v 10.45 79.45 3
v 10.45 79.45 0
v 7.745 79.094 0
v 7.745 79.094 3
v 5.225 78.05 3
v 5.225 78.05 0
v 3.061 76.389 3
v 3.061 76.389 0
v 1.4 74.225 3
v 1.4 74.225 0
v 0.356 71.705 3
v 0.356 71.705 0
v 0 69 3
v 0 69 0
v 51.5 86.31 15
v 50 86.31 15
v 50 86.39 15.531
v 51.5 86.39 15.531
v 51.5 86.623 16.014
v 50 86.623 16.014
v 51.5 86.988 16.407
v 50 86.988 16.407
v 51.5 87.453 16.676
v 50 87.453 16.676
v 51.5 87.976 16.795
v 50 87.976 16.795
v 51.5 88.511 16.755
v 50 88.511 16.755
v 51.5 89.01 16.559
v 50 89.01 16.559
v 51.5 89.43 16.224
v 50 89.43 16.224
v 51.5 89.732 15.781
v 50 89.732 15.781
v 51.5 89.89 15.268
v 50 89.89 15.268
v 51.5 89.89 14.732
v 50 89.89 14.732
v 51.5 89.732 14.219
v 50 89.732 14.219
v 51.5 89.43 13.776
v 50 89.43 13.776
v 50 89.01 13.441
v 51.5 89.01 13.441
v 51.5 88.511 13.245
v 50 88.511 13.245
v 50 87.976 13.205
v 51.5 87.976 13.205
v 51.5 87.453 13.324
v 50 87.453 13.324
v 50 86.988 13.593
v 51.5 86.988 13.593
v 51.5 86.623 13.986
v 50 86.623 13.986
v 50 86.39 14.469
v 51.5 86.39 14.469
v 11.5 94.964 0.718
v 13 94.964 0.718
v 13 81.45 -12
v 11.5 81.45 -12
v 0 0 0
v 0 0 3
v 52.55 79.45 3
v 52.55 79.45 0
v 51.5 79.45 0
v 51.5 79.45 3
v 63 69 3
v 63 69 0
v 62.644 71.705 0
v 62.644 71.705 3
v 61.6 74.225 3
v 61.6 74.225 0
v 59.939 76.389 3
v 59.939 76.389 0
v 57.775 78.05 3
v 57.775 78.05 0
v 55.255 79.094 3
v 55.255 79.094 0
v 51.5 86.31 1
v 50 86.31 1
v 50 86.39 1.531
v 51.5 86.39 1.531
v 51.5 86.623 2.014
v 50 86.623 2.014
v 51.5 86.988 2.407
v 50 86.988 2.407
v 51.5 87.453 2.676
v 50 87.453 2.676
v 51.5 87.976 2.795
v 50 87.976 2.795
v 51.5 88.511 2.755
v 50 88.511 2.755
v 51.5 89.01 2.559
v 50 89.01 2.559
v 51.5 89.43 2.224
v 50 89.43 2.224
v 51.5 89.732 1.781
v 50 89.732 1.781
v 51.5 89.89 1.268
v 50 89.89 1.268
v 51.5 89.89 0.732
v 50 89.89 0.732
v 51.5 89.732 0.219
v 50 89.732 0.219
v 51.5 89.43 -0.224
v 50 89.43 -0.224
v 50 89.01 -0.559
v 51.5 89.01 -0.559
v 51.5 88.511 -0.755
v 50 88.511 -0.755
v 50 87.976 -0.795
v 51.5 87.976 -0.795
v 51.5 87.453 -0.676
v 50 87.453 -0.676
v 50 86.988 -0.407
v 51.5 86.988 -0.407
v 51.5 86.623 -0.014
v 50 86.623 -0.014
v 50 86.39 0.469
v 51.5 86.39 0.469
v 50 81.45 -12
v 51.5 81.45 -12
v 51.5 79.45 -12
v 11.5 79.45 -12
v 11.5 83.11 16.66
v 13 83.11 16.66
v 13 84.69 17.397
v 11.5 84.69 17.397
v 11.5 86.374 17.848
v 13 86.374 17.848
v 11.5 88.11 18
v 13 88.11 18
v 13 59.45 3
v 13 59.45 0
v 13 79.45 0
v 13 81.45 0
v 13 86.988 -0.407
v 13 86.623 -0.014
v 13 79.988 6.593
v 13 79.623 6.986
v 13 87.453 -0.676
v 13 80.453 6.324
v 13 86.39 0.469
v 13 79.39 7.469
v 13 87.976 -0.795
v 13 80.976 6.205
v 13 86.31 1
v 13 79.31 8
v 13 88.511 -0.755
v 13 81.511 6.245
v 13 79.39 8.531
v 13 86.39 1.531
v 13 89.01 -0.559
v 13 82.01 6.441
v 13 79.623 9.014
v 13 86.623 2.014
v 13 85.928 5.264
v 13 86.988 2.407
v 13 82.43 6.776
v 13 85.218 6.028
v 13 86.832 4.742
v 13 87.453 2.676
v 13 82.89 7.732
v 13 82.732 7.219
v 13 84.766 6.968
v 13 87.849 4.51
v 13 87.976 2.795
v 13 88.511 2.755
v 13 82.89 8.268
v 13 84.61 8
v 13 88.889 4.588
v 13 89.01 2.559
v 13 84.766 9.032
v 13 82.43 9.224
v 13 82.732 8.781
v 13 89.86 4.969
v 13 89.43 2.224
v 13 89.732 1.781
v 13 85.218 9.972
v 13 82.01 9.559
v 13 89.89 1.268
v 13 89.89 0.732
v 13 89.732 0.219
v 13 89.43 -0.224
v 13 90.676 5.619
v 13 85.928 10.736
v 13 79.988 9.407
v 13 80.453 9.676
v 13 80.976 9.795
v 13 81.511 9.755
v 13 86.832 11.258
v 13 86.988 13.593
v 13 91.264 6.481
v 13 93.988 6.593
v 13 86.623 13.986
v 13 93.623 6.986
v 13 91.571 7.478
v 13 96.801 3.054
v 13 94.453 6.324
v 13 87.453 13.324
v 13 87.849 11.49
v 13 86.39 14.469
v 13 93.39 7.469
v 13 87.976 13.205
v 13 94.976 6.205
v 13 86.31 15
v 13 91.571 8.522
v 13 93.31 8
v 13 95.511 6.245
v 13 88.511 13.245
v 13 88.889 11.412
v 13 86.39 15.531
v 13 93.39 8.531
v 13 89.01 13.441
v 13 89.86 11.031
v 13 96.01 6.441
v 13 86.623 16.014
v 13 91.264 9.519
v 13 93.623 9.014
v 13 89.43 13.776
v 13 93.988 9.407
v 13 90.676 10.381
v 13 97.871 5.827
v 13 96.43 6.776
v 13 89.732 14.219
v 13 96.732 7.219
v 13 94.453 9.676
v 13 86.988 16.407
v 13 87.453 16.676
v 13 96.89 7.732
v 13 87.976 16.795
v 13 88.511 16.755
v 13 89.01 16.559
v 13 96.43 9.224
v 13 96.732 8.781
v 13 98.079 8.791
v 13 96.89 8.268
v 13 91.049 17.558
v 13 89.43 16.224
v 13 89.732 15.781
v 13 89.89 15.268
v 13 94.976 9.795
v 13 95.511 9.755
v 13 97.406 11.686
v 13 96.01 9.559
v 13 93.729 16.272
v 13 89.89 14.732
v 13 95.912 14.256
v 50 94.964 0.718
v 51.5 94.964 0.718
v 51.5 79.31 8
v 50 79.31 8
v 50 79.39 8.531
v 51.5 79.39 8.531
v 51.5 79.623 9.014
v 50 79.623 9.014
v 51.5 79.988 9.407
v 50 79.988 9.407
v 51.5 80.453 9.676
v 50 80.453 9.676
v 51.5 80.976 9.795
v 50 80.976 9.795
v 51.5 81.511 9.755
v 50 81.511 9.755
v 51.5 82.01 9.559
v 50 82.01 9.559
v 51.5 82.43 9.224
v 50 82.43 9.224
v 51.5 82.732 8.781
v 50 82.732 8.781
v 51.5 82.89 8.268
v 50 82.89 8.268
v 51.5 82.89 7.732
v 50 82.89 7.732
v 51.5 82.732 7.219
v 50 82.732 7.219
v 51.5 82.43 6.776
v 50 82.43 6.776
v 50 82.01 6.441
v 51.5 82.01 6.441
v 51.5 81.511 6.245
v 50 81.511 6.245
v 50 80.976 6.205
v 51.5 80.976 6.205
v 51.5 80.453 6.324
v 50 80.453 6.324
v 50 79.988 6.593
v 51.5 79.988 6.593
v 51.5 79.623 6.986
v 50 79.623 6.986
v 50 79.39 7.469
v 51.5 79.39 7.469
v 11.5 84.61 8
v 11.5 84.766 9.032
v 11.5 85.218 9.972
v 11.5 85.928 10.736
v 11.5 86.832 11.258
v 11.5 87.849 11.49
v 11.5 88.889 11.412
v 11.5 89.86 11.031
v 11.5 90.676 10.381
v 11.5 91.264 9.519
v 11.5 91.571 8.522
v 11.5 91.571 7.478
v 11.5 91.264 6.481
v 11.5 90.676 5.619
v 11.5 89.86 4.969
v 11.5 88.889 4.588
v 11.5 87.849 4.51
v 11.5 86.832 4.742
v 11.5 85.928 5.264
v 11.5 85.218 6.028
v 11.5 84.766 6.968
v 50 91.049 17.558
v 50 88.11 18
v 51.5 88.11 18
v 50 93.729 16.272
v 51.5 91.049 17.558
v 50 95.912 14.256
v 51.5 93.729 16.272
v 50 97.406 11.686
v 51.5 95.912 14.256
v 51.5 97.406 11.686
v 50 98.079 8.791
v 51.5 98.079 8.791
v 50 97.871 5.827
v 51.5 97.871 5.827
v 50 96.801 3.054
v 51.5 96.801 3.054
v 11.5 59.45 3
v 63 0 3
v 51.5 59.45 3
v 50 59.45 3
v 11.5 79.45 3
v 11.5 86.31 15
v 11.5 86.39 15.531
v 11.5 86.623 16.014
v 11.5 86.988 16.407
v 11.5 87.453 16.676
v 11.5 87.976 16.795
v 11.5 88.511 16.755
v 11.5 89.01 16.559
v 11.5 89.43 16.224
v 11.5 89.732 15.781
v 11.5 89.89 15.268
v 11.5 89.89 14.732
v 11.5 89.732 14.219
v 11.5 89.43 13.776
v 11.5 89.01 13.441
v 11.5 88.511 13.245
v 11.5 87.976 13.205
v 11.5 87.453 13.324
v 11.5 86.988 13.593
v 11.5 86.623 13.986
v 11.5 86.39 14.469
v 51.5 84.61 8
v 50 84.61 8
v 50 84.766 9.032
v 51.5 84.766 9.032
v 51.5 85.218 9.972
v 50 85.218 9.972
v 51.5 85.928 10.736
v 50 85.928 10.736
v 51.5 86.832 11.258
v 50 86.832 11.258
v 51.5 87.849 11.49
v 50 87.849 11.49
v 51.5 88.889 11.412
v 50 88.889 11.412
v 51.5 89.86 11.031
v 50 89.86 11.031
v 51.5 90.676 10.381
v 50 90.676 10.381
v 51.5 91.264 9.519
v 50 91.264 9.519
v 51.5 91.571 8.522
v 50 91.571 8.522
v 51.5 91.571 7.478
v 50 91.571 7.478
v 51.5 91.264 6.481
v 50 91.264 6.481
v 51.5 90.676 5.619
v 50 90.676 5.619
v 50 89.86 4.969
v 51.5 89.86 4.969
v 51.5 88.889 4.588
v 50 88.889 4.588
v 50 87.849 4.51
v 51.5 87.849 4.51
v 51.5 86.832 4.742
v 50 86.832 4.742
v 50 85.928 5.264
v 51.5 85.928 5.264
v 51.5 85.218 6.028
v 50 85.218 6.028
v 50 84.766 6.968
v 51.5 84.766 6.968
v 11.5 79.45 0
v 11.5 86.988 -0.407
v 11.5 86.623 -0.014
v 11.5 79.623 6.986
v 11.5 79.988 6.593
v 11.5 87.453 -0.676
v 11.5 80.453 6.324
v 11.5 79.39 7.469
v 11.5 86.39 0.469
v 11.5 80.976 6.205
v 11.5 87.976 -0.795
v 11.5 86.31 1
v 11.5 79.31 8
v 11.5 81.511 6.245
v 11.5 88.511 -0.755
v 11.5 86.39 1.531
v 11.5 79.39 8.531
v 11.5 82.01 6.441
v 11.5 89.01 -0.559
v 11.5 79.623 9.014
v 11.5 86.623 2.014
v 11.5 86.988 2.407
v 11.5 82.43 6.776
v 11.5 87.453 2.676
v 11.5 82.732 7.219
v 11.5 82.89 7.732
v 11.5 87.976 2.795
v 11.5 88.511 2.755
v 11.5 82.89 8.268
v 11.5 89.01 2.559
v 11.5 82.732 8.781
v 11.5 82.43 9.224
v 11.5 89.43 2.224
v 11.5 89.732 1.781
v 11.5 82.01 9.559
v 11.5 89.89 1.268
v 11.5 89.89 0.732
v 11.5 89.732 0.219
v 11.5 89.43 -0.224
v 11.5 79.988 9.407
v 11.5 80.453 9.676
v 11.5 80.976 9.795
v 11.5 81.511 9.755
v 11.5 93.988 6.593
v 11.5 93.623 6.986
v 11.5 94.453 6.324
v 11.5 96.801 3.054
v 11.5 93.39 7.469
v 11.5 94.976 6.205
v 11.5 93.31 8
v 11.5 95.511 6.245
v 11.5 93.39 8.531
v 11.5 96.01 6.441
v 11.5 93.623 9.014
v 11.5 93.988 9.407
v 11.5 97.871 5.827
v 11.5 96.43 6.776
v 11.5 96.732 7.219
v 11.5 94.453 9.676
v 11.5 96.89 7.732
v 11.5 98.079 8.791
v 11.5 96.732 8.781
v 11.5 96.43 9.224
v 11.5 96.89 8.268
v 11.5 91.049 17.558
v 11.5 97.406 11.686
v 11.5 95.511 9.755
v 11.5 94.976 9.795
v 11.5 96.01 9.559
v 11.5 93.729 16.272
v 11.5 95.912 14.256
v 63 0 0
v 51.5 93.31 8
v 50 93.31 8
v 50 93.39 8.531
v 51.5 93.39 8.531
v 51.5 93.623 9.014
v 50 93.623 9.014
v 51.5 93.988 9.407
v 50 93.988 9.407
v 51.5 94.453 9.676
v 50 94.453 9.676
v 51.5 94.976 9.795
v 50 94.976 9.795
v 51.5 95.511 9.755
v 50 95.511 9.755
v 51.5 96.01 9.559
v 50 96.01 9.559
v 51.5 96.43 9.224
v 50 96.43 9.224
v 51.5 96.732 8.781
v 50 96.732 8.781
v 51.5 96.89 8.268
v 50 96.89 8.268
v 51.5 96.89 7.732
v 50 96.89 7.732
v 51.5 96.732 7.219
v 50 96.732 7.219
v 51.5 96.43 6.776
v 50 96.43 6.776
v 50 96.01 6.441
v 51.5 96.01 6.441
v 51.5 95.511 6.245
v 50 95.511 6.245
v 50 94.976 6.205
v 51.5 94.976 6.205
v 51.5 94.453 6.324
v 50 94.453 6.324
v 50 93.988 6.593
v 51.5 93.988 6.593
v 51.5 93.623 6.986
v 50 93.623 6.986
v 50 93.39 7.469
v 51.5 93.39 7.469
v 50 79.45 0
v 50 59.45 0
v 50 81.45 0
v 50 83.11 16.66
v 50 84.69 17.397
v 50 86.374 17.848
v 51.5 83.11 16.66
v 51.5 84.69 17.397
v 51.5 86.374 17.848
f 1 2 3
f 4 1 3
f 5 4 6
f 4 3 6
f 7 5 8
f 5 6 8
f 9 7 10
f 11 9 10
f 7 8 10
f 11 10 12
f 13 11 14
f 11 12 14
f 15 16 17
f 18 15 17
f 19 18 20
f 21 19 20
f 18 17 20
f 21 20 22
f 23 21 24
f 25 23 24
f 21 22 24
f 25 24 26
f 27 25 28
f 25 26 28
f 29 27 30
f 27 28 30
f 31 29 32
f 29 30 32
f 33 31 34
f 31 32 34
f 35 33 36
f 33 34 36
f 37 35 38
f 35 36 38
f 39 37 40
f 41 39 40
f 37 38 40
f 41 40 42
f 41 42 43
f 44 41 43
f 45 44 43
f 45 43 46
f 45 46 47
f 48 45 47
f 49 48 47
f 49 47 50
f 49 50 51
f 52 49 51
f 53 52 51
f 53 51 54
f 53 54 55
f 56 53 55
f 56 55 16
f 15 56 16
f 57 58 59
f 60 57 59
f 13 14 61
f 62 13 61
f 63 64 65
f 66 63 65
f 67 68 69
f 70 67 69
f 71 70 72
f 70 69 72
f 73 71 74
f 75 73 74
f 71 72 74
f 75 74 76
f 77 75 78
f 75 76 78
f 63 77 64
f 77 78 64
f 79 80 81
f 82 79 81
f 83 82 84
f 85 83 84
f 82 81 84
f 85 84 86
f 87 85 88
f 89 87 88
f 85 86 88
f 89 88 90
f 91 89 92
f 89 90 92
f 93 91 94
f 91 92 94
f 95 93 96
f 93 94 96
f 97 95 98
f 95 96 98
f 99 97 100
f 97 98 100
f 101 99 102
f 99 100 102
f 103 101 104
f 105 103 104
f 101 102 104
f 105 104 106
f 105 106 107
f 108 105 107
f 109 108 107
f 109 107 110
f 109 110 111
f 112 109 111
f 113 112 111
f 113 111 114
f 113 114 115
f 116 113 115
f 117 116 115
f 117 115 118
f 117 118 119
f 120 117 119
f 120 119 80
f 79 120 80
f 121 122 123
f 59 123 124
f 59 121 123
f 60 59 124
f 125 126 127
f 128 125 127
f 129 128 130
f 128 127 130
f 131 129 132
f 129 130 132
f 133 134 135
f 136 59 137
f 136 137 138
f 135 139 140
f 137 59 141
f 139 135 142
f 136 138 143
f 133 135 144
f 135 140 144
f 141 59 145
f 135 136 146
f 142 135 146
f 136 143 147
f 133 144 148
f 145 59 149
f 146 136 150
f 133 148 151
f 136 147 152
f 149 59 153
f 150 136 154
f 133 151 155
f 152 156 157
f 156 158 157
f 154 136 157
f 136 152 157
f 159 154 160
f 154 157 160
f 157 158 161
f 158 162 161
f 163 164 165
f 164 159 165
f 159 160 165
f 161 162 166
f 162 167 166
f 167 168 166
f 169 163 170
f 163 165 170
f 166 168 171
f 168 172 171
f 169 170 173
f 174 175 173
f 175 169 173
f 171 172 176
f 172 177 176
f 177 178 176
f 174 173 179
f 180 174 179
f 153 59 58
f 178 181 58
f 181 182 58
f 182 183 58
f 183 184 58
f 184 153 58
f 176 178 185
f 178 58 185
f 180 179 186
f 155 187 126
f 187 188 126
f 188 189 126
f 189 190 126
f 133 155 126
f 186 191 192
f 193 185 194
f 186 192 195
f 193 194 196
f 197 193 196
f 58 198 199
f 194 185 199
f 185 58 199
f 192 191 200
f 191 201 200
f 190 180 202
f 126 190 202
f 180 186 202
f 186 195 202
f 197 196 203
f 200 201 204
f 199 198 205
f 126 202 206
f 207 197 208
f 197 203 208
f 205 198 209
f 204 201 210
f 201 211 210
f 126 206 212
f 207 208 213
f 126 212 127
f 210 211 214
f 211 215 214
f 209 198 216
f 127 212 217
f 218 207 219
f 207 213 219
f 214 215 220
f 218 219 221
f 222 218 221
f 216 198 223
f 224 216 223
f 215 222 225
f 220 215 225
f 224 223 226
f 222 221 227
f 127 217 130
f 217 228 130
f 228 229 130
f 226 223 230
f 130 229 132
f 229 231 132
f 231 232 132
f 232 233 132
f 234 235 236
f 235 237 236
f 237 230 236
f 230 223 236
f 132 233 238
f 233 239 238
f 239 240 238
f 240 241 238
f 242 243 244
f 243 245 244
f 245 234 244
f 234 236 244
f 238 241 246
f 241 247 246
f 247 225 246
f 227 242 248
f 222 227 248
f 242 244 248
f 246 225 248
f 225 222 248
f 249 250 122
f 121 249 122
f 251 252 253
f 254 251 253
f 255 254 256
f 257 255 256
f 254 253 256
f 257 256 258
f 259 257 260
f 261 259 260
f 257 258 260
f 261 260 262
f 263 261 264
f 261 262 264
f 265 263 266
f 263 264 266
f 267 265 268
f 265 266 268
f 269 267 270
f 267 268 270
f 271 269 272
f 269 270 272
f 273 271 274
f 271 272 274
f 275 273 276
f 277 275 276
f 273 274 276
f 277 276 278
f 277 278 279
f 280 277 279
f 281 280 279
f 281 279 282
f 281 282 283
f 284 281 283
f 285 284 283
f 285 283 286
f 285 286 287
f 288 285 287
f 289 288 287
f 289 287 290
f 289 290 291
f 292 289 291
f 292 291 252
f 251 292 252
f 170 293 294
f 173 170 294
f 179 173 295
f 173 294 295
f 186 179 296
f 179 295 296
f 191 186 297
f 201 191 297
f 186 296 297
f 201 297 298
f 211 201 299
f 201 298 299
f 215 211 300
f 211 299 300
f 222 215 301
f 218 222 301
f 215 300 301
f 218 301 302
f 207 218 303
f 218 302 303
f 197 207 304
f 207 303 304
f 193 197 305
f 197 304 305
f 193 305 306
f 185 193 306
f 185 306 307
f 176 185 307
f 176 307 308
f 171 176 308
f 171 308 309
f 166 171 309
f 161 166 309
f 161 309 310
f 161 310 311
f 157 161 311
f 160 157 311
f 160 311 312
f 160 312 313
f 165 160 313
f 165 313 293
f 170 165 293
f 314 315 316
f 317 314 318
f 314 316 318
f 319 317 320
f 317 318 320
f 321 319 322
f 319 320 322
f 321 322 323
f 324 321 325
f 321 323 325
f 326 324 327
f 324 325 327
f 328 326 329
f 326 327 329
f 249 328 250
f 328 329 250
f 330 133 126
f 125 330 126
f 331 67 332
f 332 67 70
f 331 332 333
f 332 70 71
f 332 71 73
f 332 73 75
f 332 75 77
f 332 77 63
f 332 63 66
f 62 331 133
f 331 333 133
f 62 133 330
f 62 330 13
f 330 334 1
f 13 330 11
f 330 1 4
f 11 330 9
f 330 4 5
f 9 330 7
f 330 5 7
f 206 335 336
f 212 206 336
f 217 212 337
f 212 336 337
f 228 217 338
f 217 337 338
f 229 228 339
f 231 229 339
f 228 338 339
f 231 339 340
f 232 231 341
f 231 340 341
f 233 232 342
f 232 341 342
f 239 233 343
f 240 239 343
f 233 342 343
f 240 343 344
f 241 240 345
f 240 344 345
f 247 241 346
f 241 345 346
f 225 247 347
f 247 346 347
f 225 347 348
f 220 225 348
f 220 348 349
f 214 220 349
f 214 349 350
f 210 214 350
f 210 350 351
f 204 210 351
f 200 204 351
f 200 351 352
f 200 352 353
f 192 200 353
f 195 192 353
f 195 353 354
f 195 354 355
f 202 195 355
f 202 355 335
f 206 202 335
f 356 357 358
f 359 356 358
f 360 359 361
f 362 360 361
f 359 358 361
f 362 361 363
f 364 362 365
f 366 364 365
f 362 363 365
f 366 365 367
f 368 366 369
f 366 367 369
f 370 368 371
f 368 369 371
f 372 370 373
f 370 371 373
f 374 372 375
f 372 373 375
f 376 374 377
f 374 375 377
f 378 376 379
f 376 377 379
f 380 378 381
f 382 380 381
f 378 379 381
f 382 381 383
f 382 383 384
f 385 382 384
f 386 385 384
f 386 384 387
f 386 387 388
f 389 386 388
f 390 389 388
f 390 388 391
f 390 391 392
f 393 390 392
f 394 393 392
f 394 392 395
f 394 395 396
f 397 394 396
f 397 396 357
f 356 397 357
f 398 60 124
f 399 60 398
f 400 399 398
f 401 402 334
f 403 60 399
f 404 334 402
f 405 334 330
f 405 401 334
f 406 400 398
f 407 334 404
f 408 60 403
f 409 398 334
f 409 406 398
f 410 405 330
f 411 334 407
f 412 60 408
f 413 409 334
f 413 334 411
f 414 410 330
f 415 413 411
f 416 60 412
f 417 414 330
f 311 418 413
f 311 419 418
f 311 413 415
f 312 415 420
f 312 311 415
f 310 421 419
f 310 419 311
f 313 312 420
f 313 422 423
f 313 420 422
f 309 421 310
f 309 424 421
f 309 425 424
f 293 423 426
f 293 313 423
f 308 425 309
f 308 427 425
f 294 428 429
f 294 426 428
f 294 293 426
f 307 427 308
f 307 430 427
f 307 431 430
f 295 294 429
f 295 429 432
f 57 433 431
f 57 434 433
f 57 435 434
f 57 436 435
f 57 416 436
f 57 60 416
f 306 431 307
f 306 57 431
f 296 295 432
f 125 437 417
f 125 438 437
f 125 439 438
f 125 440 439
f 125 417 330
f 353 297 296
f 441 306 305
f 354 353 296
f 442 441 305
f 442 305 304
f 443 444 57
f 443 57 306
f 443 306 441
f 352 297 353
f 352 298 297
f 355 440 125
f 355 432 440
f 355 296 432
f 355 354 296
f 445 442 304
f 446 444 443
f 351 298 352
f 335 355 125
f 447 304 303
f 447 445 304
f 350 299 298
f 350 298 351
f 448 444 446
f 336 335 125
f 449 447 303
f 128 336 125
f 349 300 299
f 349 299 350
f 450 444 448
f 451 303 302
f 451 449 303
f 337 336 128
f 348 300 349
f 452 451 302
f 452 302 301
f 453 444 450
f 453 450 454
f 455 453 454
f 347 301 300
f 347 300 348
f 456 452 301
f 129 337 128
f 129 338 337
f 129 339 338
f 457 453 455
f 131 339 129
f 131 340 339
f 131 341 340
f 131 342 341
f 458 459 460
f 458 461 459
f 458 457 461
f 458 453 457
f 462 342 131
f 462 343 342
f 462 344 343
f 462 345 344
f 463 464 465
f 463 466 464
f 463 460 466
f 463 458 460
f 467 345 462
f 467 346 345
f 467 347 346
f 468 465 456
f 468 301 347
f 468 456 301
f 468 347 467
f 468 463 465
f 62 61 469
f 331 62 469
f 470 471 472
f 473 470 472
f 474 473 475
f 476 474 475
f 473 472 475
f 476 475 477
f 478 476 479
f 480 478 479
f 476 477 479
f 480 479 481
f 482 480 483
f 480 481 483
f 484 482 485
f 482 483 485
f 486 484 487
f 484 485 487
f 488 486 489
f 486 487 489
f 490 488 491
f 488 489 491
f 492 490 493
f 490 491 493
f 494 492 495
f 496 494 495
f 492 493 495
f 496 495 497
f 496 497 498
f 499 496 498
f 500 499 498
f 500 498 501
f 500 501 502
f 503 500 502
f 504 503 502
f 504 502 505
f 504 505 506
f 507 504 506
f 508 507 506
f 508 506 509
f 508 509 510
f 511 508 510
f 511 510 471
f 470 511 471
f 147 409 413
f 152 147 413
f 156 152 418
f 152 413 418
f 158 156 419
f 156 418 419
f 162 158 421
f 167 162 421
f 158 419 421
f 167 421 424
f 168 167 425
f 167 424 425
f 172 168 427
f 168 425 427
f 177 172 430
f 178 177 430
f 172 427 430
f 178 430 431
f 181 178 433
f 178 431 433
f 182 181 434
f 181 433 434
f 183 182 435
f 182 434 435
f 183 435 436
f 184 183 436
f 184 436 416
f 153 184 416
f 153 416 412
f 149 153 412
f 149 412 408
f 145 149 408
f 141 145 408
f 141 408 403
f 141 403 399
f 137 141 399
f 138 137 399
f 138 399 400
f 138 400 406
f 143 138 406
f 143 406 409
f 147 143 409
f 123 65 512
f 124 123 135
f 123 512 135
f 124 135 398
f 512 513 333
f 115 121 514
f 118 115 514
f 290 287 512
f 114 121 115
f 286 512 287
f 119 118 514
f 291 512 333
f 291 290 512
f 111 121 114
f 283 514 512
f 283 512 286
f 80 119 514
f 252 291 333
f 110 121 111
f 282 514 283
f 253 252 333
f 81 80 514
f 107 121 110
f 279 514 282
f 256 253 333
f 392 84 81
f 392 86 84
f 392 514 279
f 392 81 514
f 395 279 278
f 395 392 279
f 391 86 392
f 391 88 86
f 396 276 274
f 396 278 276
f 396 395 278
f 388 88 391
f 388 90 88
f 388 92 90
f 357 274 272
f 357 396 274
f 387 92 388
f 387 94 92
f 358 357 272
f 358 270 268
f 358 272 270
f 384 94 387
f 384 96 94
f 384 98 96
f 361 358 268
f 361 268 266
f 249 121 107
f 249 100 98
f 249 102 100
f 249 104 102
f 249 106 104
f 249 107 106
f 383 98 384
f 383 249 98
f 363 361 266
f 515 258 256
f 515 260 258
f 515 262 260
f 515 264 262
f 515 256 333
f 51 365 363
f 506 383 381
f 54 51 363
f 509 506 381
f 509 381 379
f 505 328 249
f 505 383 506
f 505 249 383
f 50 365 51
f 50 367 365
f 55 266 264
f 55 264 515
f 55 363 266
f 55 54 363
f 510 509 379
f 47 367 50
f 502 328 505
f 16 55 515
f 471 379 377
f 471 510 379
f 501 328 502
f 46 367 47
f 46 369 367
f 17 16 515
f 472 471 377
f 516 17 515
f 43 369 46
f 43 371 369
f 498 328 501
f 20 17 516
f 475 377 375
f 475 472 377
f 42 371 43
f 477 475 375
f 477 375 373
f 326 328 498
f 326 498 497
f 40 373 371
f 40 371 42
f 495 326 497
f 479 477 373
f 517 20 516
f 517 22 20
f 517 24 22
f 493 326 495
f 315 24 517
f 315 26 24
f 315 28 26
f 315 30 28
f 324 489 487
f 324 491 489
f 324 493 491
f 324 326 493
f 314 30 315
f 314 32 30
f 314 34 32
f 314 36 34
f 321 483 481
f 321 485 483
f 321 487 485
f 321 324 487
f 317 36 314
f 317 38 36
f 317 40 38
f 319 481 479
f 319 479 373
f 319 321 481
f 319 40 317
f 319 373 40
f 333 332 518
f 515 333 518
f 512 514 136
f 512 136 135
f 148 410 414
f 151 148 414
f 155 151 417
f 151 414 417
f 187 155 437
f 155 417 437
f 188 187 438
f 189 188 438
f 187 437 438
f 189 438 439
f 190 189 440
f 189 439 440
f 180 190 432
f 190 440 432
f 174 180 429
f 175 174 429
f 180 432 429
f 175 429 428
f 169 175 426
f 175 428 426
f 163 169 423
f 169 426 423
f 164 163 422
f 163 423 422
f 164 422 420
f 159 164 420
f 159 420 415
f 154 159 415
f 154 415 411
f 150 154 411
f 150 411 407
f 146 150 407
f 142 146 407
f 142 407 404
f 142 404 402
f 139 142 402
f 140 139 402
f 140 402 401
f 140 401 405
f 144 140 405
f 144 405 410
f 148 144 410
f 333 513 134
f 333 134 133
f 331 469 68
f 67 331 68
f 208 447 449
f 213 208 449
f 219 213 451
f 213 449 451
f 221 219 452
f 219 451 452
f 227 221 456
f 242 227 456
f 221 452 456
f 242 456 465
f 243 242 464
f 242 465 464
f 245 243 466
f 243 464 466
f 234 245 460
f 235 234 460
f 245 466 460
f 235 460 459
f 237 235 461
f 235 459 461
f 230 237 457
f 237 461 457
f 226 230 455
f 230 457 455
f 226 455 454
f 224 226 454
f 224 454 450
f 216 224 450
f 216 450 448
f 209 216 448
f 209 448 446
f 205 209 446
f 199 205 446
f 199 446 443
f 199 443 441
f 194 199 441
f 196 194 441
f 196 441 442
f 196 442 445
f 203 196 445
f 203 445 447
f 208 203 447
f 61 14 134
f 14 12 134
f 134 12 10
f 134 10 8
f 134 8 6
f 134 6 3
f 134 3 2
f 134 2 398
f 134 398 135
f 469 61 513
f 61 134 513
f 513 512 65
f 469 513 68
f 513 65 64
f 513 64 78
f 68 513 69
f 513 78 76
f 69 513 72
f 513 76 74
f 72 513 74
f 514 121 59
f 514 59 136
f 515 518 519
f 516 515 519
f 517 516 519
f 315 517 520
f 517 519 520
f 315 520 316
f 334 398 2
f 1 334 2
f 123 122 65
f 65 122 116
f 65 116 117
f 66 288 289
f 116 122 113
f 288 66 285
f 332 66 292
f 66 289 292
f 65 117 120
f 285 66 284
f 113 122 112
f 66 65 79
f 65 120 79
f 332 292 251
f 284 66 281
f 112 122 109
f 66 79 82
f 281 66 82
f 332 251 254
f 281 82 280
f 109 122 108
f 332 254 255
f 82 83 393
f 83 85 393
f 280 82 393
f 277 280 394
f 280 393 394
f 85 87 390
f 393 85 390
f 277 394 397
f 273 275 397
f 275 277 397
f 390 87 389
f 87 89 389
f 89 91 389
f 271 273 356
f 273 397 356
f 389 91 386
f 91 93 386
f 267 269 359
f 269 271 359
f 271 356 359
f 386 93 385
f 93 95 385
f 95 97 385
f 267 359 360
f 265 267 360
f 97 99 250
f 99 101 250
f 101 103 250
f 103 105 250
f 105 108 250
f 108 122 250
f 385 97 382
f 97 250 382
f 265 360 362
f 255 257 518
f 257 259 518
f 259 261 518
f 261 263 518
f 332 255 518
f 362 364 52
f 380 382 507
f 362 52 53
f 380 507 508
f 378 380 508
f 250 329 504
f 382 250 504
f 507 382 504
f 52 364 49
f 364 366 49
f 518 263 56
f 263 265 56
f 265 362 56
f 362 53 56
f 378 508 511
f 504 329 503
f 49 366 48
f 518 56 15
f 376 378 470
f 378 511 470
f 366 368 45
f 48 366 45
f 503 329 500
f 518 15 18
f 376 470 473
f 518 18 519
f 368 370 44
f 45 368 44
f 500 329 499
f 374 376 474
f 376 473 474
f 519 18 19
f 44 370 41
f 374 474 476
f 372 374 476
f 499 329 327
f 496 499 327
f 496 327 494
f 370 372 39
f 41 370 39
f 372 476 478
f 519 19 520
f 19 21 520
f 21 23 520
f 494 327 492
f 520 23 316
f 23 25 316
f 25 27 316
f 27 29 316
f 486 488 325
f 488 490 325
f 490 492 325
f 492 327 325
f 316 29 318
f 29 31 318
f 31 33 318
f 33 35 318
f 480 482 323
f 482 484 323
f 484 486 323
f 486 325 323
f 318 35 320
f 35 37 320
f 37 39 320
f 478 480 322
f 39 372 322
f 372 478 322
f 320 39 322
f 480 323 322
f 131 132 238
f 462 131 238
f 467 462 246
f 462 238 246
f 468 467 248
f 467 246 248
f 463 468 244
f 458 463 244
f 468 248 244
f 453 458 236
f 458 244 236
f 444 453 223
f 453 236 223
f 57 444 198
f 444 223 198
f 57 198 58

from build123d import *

# Parameters (mm, degrees)
EXTRUDE_1_DEPTH          = 3
SKETCH_13_W              = 40
SKETCH_13_H              = 2
EXTRUDE_3_DEPTH          = 15
EXTRUDE_4_DEPTH          = 20
EXTRUDE_4_DEPTH_BACK     = 20
CUT_EXTRUDE_6_DEPTH      = 18.5
CUT_EXTRUDE_6_DEPTH_BACK = 18.5
CUT_EXTRUDE_7_REACH      = 114.258
SKETCH_16_R              = 1.8
SKETCH_16_R_2            = 3.5


with BuildPart() as part:
    # 草图2 → 凸台-拉伸1 (new body)
    with BuildSketch(Plane.XY):
        with BuildLine():
            Line((0, 0), (63, 0))
            Line((63, 0), (63, 69))
            ThreePointArc((63, 69), (59.939265863, 76.389265863), (52.55, 79.45))
            Line((52.55, 79.45), (10.45, 79.45))
            ThreePointArc((10.45, 79.45), (3.060734137, 76.389265863), (0, 69))
            Line((0, 69), (0, 0))
        make_face()
    extrude(amount=EXTRUDE_1_DEPTH)

    # 草图13 → 凸台-拉伸3 (add)
    with BuildSketch(Plane(origin=(0, 0, 3), x_dir=(-1, 0, 0), z_dir=(0, 0, -1))):
        with Locations((-31.5, 80.45)):
            Rectangle(SKETCH_13_W, SKETCH_13_H)
    extrude(amount=EXTRUDE_3_DEPTH)

    # 草图14 → 凸台-拉伸4 (add, two sides: drawn at the far end of the back side and taken through both)
    with BuildSketch(Plane.ZY.offset(-31.5).offset(-EXTRUDE_4_DEPTH_BACK)):
        with BuildLine():
            ThreePointArc((3, 79.45), (10.588190451, 78.450995775), (16.660254038, 83.110254038))
            ThreePointArc((16.660254038, 83.110254038), (17.659258263, 85.522063587), (18, 88.110254038))
            ThreePointArc((18, 88.110254038), (11.686285655, 97.406021788), (0.717740386, 94.9636251))
            ThreePointArc((0.717740386, 94.9636251), (-1.999142036, 88.241244641), (0.540709407, 81.45))
            Line((0.540709407, 81.45), (3, 81.45))
            Line((3, 81.45), (3, 79.45))
        make_face()
        with BuildLine():
            ThreePointArc((0.540709407, 81.45), (1.690603791, 80.351934666), (3, 79.45))
            Line((3, 79.45), (3, 81.45))
            Line((3, 81.45), (0.540709407, 81.45))
        make_face()
        with BuildLine():
            ThreePointArc((0.540709407, 81.45), (-1.999142036, 88.241244641), (0.717740386, 94.9636251))
            Line((0.717740386, 94.9636251), (-12, 81.45))
            Line((-12, 81.45), (0.540709407, 81.45))
        make_face()
        with BuildLine():
            Line((3, 59.45), (16.660254038, 83.110254038))
            ThreePointArc((16.660254038, 83.110254038), (10.588190451, 78.450995775), (3, 79.45))
            Line((3, 79.45), (3, 59.45))
        make_face()
    extrude(amount=EXTRUDE_4_DEPTH + EXTRUDE_4_DEPTH_BACK)

    # 草图15 → 切除-拉伸6 (cut, two sides: drawn at the far end of the back side and taken through both)
    with BuildSketch(Plane.ZY.offset(-31.5).offset(-CUT_EXTRUDE_6_DEPTH_BACK)):
        with BuildLine():
            Line((0, 59.45), (3, 59.45))
            Line((3, 59.45), (16.660254038, 83.110254038))
            ThreePointArc((16.660254038, 83.110254038), (13.96660025, 96.13519525), (0.717740386, 94.9636251))
            Line((0.717740386, 94.9636251), (-12, 81.45))
            Line((-12, 81.45), (0, 81.45))
            Line((0, 81.45), (0, 59.45))
        make_face()
    extrude(amount=CUT_EXTRUDE_6_DEPTH + CUT_EXTRUDE_6_DEPTH_BACK, mode=Mode.SUBTRACT)

    # 切除-拉伸7: up to this face of the body (flat: up to its plane)
    cut_extrude_7_end = Plane(part.part.faces().sort_by_distance((51.5, 84.002247989, 5.535309017))[0])
    # 草图16 → 切除-拉伸7 (cut, up to the picked face)
    with BuildSketch(Plane.ZY.offset(-11.5), mode=Mode.PRIVATE) as cut_extrude_7_sk1:
        with Locations(Location((8, 95.110254038, 0), (0, 0, 270))):
            Circle(SKETCH_16_R)
    cut_extrude_7_tool1 = split(extrude(cut_extrude_7_sk1.sketch, amount=-CUT_EXTRUDE_7_REACH, mode=Mode.PRIVATE), bisect_by=cut_extrude_7_end, keep=Keep.BOTH, mode=Mode.PRIVATE)
    # 草图16 → 切除-拉伸7 (cut, up to the picked face)
    with BuildSketch(Plane.ZY.offset(-11.5), mode=Mode.PRIVATE) as cut_extrude_7_sk2:
        with Locations(Location((15, 88.110254038, 0), (0, 0, 270))):
            Circle(SKETCH_16_R)
    cut_extrude_7_tool2 = split(extrude(cut_extrude_7_sk2.sketch, amount=-CUT_EXTRUDE_7_REACH, mode=Mode.PRIVATE), bisect_by=cut_extrude_7_end, keep=Keep.BOTH, mode=Mode.PRIVATE)
    # 草图16 → 切除-拉伸7 (cut, up to the picked face)
    with BuildSketch(Plane.ZY.offset(-11.5), mode=Mode.PRIVATE) as cut_extrude_7_sk3:
        with Locations(Location((8, 81.110254038, 0), (0, 0, 270))):
            Circle(SKETCH_16_R)
    cut_extrude_7_tool3 = split(extrude(cut_extrude_7_sk3.sketch, amount=-CUT_EXTRUDE_7_REACH, mode=Mode.PRIVATE), bisect_by=cut_extrude_7_end, keep=Keep.BOTH, mode=Mode.PRIVATE)
    # 草图16 → 切除-拉伸7 (cut, up to the picked face)
    with BuildSketch(Plane.ZY.offset(-11.5), mode=Mode.PRIVATE) as cut_extrude_7_sk4:
        with Locations(Location((1, 88.110254038, 0), (0, 0, 270))):
            Circle(SKETCH_16_R)
    cut_extrude_7_tool4 = split(extrude(cut_extrude_7_sk4.sketch, amount=-CUT_EXTRUDE_7_REACH, mode=Mode.PRIVATE), bisect_by=cut_extrude_7_end, keep=Keep.BOTH, mode=Mode.PRIVATE)
    # 草图16 → 切除-拉伸7 (cut, up to the picked face)
    with BuildSketch(Plane.ZY.offset(-11.5), mode=Mode.PRIVATE) as cut_extrude_7_sk5:
        with Locations(Location((8, 88.110254038, 0), (0, 0, 270))):
            Circle(SKETCH_16_R_2)
    cut_extrude_7_tool5 = split(extrude(cut_extrude_7_sk5.sketch, amount=-CUT_EXTRUDE_7_REACH, mode=Mode.PRIVATE), bisect_by=cut_extrude_7_end, keep=Keep.BOTH, mode=Mode.PRIVATE)
    add(cut_extrude_7_tool1.solids().sort_by(Axis((11.5, 95.110254, 8), (1, 0, 0)))[0], mode=Mode.SUBTRACT)
    add(cut_extrude_7_tool2.solids().sort_by(Axis((11.5, 88.110254, 15), (1, 0, 0)))[0], mode=Mode.SUBTRACT)
    add(cut_extrude_7_tool3.solids().sort_by(Axis((11.5, 81.110254, 8), (1, 0, 0)))[0], mode=Mode.SUBTRACT)
    add(cut_extrude_7_tool4.solids().sort_by(Axis((11.5, 88.110254, 1), (1, 0, 0)))[0], mode=Mode.SUBTRACT)
    add(cut_extrude_7_tool5.solids().sort_by(Axis((11.5, 88.110254, 8), (1, 0, 0)))[0], mode=Mode.SUBTRACT)


solid = part.part
